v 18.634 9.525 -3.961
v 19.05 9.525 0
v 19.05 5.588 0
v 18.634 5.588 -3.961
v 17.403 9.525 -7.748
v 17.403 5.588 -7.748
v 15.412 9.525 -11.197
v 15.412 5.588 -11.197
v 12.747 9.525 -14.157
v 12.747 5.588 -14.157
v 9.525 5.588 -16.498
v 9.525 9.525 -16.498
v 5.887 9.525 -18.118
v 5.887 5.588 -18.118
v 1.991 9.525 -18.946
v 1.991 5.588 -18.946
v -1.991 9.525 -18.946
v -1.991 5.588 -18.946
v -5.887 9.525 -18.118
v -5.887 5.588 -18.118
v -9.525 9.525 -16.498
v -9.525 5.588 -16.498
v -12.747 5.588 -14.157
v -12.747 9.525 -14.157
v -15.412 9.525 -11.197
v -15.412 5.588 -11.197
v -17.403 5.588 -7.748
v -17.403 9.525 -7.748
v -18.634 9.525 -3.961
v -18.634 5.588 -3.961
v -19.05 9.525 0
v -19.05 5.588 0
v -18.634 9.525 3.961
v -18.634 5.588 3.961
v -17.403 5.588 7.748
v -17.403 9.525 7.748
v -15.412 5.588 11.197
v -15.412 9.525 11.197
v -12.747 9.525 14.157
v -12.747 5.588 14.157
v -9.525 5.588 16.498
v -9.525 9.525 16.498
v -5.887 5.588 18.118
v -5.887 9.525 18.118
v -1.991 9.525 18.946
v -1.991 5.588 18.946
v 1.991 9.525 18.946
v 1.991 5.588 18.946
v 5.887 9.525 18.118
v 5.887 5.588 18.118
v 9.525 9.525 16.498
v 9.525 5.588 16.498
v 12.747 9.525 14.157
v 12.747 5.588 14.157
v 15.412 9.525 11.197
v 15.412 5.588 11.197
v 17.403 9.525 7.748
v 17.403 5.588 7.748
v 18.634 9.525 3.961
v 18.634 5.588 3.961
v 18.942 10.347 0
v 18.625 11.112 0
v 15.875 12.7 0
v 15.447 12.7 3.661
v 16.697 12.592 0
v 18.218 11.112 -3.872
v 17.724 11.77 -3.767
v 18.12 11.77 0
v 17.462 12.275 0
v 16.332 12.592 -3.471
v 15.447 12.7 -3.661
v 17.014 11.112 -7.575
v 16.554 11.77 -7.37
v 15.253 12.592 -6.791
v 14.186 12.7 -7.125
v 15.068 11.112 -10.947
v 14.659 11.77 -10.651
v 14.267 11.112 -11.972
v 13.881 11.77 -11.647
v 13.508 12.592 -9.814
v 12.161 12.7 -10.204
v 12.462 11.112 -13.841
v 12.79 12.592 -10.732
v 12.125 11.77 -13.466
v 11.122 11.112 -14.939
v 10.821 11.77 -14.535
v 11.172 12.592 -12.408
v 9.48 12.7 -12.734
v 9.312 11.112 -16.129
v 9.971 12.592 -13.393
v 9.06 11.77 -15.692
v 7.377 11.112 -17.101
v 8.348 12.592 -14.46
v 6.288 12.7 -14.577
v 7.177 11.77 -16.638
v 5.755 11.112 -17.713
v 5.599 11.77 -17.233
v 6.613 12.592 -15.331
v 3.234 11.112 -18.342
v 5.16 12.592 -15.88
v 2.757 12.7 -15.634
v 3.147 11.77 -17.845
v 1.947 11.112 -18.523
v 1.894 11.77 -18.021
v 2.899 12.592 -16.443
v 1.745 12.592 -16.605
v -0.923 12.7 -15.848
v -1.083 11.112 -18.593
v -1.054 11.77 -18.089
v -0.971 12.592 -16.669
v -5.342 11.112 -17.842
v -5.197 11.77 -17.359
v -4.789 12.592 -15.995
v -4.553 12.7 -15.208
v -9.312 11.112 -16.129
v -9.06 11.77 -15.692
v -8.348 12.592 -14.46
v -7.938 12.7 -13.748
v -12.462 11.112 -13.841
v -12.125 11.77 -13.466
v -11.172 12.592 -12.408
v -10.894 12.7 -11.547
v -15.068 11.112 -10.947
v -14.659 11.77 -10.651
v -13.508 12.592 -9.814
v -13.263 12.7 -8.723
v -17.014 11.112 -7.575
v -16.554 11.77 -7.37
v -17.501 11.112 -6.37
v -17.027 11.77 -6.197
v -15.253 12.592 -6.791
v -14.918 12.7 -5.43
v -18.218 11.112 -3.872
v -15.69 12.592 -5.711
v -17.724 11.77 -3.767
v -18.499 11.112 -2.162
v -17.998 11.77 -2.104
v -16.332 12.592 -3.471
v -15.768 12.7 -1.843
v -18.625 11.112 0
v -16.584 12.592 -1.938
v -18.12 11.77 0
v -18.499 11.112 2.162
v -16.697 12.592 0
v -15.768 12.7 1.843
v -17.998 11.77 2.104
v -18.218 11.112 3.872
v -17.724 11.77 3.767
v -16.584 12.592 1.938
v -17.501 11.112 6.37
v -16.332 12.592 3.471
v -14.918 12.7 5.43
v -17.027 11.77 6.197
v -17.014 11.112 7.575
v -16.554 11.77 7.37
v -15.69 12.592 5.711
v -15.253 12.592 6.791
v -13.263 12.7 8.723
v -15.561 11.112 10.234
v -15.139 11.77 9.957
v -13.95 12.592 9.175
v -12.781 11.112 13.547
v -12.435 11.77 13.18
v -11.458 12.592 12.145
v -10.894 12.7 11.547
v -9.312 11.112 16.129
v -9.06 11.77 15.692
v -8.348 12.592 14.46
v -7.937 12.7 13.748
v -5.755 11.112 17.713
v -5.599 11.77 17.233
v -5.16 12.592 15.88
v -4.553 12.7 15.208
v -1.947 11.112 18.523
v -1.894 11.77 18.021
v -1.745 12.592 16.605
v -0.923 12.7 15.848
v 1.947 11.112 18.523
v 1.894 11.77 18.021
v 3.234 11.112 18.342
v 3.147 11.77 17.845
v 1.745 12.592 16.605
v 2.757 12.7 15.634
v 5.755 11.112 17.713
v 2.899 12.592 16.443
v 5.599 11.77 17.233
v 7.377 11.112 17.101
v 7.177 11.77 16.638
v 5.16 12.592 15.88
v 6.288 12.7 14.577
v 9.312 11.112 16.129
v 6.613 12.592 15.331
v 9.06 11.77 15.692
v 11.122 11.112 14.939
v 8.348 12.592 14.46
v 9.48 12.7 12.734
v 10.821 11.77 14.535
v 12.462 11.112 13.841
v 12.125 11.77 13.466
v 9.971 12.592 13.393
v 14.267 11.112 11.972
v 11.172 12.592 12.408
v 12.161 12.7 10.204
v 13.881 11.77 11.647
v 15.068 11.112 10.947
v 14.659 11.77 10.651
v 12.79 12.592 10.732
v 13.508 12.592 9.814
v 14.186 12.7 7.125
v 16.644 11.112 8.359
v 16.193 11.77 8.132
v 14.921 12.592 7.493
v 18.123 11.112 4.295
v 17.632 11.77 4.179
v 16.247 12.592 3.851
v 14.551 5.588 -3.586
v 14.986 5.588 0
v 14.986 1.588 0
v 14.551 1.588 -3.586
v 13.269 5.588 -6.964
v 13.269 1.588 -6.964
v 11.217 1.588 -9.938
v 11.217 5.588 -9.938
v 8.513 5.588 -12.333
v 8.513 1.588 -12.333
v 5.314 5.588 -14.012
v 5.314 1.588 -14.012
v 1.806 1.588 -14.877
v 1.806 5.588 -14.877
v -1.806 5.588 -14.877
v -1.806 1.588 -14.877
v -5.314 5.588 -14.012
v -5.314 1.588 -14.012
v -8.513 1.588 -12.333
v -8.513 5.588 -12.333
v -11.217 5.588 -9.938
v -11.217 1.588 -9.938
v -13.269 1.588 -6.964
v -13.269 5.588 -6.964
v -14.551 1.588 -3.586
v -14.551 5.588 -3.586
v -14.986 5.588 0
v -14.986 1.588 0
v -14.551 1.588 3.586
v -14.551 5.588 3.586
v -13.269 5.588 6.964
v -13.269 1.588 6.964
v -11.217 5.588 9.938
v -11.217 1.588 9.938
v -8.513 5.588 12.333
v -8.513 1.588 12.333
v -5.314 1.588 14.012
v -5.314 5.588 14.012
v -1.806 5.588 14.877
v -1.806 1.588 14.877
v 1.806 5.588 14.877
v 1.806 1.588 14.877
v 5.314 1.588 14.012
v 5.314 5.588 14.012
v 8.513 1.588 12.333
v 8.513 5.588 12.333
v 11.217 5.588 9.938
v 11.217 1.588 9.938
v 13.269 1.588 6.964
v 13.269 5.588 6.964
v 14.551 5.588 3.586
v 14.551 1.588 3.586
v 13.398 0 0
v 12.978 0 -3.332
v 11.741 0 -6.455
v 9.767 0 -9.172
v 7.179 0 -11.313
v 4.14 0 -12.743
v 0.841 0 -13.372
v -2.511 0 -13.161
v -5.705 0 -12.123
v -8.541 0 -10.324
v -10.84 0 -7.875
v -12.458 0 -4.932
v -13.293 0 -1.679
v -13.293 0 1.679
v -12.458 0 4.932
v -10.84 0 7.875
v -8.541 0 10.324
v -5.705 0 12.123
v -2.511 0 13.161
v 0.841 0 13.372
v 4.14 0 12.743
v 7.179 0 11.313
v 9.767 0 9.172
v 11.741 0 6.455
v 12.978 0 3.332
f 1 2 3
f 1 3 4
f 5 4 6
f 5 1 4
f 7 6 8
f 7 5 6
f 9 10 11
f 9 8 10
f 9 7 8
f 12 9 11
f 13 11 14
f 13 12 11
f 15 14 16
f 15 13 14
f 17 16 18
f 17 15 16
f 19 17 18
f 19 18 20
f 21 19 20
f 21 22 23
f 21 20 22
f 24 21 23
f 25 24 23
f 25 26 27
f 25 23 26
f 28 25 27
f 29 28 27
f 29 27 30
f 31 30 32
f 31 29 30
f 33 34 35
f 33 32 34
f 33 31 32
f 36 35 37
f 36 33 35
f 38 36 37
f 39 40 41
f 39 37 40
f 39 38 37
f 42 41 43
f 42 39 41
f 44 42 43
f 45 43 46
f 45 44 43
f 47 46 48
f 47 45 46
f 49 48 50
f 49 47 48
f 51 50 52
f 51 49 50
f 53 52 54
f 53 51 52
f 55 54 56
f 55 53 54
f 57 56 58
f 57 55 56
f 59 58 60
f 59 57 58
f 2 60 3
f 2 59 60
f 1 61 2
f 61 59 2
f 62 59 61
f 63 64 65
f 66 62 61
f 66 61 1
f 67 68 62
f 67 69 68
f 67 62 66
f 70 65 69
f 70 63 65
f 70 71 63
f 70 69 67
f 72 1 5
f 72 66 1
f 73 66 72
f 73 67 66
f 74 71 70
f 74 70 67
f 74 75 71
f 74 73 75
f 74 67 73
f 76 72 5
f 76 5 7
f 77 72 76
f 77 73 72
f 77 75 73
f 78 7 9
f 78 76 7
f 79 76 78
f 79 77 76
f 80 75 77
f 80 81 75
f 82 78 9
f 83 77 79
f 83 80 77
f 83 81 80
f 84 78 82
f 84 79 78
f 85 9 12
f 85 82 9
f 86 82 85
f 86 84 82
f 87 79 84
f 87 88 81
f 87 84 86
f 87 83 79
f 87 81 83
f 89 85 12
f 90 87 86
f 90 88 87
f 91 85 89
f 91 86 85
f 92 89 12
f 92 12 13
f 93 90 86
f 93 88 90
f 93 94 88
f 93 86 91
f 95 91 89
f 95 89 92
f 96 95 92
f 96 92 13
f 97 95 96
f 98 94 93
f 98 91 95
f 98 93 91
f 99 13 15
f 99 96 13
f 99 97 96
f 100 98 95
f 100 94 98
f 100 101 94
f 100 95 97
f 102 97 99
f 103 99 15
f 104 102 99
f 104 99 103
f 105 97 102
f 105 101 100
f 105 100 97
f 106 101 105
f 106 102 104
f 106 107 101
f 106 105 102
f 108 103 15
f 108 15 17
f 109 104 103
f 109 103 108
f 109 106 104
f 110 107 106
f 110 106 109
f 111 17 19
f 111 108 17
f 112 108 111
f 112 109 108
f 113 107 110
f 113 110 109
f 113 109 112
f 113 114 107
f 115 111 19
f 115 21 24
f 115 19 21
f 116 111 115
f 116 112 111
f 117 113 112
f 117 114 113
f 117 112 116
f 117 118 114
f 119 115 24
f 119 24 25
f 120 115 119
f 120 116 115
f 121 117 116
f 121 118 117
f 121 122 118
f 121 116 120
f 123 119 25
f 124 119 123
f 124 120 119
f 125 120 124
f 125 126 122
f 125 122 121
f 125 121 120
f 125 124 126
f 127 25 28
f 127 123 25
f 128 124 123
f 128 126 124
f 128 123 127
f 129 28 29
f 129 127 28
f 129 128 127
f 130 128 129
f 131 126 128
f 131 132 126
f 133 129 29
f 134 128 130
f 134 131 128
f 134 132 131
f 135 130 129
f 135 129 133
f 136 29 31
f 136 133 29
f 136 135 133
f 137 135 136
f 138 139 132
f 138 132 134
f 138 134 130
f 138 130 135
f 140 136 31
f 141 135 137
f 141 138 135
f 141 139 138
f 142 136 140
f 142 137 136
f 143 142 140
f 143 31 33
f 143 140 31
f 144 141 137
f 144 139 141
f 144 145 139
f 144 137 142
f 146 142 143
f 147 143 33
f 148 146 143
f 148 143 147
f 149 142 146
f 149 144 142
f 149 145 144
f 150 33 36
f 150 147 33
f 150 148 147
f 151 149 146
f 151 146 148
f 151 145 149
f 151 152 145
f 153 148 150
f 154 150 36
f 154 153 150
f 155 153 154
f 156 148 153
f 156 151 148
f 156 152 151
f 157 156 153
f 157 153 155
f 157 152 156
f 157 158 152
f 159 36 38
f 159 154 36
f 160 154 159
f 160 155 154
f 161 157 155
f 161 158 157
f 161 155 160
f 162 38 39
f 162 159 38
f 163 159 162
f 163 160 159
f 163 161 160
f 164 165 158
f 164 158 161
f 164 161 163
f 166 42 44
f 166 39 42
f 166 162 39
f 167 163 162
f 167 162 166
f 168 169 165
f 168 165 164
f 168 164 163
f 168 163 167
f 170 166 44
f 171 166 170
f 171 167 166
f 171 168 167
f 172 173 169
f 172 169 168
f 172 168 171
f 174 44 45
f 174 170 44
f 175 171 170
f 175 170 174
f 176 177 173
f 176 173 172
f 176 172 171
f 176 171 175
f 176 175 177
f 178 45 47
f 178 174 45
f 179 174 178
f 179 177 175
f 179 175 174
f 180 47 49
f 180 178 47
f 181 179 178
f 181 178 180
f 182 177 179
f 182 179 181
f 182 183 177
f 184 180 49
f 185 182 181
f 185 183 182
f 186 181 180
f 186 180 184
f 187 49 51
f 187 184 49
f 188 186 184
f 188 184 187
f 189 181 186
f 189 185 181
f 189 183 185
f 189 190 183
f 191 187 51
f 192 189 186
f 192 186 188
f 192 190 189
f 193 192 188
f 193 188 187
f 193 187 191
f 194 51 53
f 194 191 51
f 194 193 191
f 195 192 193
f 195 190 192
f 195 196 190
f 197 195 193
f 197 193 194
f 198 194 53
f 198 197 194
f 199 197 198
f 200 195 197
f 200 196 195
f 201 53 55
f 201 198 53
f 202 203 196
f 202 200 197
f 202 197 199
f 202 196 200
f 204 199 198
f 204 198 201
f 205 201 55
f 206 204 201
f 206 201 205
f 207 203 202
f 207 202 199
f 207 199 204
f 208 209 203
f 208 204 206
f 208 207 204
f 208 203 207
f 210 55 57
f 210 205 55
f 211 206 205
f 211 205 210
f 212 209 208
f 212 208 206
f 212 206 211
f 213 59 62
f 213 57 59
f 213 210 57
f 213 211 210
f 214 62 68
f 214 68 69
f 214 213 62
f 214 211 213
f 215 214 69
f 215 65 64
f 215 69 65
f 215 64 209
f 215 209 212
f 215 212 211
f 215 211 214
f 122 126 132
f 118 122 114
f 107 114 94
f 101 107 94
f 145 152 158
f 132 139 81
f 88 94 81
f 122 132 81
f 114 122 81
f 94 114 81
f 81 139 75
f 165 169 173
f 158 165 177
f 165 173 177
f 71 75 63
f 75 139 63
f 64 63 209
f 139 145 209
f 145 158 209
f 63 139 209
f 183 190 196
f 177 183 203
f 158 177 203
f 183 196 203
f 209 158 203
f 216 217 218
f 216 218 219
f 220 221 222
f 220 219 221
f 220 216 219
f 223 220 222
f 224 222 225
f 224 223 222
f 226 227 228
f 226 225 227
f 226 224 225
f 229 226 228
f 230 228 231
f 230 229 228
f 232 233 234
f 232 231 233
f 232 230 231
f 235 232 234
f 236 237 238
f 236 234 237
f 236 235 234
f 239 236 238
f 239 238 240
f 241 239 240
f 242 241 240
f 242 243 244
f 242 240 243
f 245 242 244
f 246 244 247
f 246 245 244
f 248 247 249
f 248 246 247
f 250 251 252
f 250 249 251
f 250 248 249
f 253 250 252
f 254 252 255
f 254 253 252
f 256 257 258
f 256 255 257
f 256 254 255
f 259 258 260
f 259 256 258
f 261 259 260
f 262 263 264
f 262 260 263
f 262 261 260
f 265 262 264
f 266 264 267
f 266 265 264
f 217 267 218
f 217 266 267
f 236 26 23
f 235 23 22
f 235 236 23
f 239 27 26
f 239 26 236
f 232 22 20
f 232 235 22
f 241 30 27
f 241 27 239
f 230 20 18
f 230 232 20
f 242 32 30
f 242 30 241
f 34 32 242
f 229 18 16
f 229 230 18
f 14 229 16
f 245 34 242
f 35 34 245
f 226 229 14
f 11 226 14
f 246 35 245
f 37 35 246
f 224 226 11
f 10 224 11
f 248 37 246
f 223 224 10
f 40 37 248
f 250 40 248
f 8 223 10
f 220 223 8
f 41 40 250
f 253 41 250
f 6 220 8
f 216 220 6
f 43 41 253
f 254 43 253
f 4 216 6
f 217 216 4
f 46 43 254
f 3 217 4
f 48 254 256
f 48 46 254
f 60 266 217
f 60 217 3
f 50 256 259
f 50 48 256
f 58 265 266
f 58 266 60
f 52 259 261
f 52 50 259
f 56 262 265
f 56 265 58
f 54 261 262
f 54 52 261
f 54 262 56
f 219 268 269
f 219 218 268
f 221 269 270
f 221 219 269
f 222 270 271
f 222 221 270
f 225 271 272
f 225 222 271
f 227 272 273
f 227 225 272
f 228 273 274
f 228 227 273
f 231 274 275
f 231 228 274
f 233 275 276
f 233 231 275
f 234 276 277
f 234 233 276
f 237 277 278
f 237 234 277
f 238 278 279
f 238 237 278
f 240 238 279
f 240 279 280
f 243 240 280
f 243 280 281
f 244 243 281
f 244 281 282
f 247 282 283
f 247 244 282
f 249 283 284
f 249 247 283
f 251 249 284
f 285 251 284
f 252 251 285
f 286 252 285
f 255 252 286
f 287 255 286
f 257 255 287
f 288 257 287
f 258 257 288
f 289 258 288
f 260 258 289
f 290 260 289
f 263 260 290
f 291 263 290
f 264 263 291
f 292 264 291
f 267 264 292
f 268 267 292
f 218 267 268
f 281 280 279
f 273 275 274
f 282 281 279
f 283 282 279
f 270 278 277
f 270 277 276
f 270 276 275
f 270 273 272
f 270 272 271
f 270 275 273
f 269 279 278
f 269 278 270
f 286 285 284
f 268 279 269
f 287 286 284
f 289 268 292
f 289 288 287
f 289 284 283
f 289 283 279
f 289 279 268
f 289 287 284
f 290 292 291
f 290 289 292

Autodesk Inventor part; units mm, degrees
ref_plane "YZ Plane" through (0, 0, 0) normal (1, 0, 0) x (0, 1, 0)
ref_plane "XZ Plane" through (0, 0, 0) normal (0, 1, 0) x (-1, 0, 0)
ref_plane "XY Plane" through (0, 0, 0) normal (0, 0, 1) x (1, 0, 0)
sketch "Sketch1" plane through (0, 0, 0) normal (0, 0, 1) x (1, 0, 0)
  line L0 (0, 0) -> (14.986, 0)
  line L1 (14.986, 0) -> (14.986, 5.588)
  line L2 (14.986, 5.588) -> (0, 5.588)
  line L3 (0, 5.588) -> (0, 0)
  line L4 (0, 5.588) -> (19.05, 5.588)
  line L5 (19.05, 5.588) -> (19.05, 9.525)
  line L6 (15.875, 12.7) -> (0, 12.7)
  line L7 (0, 12.7) -> (0, 5.588)
  arc A0 (19.05, 9.525) -> (15.875, 12.7) centre (15.875, 9.525) ccw
  dimension "d0" = 14.986
  dimension "d1" = 5.588
  dimension "d2" = 19.05
  dimension "d3" = 12.7
  dimension "d4" = 3.175
revolve "Revolution1" add sketch "Sketch1" angle 360 about axis through (0, 5.588, 0) along (0, -1, 0)
chamfer "Chamfer1" distance 1.5875 angle 45 1 edges at (-14.986, 0, 0)
properties part number "2016.06.09 Judson M204 bung cover"
